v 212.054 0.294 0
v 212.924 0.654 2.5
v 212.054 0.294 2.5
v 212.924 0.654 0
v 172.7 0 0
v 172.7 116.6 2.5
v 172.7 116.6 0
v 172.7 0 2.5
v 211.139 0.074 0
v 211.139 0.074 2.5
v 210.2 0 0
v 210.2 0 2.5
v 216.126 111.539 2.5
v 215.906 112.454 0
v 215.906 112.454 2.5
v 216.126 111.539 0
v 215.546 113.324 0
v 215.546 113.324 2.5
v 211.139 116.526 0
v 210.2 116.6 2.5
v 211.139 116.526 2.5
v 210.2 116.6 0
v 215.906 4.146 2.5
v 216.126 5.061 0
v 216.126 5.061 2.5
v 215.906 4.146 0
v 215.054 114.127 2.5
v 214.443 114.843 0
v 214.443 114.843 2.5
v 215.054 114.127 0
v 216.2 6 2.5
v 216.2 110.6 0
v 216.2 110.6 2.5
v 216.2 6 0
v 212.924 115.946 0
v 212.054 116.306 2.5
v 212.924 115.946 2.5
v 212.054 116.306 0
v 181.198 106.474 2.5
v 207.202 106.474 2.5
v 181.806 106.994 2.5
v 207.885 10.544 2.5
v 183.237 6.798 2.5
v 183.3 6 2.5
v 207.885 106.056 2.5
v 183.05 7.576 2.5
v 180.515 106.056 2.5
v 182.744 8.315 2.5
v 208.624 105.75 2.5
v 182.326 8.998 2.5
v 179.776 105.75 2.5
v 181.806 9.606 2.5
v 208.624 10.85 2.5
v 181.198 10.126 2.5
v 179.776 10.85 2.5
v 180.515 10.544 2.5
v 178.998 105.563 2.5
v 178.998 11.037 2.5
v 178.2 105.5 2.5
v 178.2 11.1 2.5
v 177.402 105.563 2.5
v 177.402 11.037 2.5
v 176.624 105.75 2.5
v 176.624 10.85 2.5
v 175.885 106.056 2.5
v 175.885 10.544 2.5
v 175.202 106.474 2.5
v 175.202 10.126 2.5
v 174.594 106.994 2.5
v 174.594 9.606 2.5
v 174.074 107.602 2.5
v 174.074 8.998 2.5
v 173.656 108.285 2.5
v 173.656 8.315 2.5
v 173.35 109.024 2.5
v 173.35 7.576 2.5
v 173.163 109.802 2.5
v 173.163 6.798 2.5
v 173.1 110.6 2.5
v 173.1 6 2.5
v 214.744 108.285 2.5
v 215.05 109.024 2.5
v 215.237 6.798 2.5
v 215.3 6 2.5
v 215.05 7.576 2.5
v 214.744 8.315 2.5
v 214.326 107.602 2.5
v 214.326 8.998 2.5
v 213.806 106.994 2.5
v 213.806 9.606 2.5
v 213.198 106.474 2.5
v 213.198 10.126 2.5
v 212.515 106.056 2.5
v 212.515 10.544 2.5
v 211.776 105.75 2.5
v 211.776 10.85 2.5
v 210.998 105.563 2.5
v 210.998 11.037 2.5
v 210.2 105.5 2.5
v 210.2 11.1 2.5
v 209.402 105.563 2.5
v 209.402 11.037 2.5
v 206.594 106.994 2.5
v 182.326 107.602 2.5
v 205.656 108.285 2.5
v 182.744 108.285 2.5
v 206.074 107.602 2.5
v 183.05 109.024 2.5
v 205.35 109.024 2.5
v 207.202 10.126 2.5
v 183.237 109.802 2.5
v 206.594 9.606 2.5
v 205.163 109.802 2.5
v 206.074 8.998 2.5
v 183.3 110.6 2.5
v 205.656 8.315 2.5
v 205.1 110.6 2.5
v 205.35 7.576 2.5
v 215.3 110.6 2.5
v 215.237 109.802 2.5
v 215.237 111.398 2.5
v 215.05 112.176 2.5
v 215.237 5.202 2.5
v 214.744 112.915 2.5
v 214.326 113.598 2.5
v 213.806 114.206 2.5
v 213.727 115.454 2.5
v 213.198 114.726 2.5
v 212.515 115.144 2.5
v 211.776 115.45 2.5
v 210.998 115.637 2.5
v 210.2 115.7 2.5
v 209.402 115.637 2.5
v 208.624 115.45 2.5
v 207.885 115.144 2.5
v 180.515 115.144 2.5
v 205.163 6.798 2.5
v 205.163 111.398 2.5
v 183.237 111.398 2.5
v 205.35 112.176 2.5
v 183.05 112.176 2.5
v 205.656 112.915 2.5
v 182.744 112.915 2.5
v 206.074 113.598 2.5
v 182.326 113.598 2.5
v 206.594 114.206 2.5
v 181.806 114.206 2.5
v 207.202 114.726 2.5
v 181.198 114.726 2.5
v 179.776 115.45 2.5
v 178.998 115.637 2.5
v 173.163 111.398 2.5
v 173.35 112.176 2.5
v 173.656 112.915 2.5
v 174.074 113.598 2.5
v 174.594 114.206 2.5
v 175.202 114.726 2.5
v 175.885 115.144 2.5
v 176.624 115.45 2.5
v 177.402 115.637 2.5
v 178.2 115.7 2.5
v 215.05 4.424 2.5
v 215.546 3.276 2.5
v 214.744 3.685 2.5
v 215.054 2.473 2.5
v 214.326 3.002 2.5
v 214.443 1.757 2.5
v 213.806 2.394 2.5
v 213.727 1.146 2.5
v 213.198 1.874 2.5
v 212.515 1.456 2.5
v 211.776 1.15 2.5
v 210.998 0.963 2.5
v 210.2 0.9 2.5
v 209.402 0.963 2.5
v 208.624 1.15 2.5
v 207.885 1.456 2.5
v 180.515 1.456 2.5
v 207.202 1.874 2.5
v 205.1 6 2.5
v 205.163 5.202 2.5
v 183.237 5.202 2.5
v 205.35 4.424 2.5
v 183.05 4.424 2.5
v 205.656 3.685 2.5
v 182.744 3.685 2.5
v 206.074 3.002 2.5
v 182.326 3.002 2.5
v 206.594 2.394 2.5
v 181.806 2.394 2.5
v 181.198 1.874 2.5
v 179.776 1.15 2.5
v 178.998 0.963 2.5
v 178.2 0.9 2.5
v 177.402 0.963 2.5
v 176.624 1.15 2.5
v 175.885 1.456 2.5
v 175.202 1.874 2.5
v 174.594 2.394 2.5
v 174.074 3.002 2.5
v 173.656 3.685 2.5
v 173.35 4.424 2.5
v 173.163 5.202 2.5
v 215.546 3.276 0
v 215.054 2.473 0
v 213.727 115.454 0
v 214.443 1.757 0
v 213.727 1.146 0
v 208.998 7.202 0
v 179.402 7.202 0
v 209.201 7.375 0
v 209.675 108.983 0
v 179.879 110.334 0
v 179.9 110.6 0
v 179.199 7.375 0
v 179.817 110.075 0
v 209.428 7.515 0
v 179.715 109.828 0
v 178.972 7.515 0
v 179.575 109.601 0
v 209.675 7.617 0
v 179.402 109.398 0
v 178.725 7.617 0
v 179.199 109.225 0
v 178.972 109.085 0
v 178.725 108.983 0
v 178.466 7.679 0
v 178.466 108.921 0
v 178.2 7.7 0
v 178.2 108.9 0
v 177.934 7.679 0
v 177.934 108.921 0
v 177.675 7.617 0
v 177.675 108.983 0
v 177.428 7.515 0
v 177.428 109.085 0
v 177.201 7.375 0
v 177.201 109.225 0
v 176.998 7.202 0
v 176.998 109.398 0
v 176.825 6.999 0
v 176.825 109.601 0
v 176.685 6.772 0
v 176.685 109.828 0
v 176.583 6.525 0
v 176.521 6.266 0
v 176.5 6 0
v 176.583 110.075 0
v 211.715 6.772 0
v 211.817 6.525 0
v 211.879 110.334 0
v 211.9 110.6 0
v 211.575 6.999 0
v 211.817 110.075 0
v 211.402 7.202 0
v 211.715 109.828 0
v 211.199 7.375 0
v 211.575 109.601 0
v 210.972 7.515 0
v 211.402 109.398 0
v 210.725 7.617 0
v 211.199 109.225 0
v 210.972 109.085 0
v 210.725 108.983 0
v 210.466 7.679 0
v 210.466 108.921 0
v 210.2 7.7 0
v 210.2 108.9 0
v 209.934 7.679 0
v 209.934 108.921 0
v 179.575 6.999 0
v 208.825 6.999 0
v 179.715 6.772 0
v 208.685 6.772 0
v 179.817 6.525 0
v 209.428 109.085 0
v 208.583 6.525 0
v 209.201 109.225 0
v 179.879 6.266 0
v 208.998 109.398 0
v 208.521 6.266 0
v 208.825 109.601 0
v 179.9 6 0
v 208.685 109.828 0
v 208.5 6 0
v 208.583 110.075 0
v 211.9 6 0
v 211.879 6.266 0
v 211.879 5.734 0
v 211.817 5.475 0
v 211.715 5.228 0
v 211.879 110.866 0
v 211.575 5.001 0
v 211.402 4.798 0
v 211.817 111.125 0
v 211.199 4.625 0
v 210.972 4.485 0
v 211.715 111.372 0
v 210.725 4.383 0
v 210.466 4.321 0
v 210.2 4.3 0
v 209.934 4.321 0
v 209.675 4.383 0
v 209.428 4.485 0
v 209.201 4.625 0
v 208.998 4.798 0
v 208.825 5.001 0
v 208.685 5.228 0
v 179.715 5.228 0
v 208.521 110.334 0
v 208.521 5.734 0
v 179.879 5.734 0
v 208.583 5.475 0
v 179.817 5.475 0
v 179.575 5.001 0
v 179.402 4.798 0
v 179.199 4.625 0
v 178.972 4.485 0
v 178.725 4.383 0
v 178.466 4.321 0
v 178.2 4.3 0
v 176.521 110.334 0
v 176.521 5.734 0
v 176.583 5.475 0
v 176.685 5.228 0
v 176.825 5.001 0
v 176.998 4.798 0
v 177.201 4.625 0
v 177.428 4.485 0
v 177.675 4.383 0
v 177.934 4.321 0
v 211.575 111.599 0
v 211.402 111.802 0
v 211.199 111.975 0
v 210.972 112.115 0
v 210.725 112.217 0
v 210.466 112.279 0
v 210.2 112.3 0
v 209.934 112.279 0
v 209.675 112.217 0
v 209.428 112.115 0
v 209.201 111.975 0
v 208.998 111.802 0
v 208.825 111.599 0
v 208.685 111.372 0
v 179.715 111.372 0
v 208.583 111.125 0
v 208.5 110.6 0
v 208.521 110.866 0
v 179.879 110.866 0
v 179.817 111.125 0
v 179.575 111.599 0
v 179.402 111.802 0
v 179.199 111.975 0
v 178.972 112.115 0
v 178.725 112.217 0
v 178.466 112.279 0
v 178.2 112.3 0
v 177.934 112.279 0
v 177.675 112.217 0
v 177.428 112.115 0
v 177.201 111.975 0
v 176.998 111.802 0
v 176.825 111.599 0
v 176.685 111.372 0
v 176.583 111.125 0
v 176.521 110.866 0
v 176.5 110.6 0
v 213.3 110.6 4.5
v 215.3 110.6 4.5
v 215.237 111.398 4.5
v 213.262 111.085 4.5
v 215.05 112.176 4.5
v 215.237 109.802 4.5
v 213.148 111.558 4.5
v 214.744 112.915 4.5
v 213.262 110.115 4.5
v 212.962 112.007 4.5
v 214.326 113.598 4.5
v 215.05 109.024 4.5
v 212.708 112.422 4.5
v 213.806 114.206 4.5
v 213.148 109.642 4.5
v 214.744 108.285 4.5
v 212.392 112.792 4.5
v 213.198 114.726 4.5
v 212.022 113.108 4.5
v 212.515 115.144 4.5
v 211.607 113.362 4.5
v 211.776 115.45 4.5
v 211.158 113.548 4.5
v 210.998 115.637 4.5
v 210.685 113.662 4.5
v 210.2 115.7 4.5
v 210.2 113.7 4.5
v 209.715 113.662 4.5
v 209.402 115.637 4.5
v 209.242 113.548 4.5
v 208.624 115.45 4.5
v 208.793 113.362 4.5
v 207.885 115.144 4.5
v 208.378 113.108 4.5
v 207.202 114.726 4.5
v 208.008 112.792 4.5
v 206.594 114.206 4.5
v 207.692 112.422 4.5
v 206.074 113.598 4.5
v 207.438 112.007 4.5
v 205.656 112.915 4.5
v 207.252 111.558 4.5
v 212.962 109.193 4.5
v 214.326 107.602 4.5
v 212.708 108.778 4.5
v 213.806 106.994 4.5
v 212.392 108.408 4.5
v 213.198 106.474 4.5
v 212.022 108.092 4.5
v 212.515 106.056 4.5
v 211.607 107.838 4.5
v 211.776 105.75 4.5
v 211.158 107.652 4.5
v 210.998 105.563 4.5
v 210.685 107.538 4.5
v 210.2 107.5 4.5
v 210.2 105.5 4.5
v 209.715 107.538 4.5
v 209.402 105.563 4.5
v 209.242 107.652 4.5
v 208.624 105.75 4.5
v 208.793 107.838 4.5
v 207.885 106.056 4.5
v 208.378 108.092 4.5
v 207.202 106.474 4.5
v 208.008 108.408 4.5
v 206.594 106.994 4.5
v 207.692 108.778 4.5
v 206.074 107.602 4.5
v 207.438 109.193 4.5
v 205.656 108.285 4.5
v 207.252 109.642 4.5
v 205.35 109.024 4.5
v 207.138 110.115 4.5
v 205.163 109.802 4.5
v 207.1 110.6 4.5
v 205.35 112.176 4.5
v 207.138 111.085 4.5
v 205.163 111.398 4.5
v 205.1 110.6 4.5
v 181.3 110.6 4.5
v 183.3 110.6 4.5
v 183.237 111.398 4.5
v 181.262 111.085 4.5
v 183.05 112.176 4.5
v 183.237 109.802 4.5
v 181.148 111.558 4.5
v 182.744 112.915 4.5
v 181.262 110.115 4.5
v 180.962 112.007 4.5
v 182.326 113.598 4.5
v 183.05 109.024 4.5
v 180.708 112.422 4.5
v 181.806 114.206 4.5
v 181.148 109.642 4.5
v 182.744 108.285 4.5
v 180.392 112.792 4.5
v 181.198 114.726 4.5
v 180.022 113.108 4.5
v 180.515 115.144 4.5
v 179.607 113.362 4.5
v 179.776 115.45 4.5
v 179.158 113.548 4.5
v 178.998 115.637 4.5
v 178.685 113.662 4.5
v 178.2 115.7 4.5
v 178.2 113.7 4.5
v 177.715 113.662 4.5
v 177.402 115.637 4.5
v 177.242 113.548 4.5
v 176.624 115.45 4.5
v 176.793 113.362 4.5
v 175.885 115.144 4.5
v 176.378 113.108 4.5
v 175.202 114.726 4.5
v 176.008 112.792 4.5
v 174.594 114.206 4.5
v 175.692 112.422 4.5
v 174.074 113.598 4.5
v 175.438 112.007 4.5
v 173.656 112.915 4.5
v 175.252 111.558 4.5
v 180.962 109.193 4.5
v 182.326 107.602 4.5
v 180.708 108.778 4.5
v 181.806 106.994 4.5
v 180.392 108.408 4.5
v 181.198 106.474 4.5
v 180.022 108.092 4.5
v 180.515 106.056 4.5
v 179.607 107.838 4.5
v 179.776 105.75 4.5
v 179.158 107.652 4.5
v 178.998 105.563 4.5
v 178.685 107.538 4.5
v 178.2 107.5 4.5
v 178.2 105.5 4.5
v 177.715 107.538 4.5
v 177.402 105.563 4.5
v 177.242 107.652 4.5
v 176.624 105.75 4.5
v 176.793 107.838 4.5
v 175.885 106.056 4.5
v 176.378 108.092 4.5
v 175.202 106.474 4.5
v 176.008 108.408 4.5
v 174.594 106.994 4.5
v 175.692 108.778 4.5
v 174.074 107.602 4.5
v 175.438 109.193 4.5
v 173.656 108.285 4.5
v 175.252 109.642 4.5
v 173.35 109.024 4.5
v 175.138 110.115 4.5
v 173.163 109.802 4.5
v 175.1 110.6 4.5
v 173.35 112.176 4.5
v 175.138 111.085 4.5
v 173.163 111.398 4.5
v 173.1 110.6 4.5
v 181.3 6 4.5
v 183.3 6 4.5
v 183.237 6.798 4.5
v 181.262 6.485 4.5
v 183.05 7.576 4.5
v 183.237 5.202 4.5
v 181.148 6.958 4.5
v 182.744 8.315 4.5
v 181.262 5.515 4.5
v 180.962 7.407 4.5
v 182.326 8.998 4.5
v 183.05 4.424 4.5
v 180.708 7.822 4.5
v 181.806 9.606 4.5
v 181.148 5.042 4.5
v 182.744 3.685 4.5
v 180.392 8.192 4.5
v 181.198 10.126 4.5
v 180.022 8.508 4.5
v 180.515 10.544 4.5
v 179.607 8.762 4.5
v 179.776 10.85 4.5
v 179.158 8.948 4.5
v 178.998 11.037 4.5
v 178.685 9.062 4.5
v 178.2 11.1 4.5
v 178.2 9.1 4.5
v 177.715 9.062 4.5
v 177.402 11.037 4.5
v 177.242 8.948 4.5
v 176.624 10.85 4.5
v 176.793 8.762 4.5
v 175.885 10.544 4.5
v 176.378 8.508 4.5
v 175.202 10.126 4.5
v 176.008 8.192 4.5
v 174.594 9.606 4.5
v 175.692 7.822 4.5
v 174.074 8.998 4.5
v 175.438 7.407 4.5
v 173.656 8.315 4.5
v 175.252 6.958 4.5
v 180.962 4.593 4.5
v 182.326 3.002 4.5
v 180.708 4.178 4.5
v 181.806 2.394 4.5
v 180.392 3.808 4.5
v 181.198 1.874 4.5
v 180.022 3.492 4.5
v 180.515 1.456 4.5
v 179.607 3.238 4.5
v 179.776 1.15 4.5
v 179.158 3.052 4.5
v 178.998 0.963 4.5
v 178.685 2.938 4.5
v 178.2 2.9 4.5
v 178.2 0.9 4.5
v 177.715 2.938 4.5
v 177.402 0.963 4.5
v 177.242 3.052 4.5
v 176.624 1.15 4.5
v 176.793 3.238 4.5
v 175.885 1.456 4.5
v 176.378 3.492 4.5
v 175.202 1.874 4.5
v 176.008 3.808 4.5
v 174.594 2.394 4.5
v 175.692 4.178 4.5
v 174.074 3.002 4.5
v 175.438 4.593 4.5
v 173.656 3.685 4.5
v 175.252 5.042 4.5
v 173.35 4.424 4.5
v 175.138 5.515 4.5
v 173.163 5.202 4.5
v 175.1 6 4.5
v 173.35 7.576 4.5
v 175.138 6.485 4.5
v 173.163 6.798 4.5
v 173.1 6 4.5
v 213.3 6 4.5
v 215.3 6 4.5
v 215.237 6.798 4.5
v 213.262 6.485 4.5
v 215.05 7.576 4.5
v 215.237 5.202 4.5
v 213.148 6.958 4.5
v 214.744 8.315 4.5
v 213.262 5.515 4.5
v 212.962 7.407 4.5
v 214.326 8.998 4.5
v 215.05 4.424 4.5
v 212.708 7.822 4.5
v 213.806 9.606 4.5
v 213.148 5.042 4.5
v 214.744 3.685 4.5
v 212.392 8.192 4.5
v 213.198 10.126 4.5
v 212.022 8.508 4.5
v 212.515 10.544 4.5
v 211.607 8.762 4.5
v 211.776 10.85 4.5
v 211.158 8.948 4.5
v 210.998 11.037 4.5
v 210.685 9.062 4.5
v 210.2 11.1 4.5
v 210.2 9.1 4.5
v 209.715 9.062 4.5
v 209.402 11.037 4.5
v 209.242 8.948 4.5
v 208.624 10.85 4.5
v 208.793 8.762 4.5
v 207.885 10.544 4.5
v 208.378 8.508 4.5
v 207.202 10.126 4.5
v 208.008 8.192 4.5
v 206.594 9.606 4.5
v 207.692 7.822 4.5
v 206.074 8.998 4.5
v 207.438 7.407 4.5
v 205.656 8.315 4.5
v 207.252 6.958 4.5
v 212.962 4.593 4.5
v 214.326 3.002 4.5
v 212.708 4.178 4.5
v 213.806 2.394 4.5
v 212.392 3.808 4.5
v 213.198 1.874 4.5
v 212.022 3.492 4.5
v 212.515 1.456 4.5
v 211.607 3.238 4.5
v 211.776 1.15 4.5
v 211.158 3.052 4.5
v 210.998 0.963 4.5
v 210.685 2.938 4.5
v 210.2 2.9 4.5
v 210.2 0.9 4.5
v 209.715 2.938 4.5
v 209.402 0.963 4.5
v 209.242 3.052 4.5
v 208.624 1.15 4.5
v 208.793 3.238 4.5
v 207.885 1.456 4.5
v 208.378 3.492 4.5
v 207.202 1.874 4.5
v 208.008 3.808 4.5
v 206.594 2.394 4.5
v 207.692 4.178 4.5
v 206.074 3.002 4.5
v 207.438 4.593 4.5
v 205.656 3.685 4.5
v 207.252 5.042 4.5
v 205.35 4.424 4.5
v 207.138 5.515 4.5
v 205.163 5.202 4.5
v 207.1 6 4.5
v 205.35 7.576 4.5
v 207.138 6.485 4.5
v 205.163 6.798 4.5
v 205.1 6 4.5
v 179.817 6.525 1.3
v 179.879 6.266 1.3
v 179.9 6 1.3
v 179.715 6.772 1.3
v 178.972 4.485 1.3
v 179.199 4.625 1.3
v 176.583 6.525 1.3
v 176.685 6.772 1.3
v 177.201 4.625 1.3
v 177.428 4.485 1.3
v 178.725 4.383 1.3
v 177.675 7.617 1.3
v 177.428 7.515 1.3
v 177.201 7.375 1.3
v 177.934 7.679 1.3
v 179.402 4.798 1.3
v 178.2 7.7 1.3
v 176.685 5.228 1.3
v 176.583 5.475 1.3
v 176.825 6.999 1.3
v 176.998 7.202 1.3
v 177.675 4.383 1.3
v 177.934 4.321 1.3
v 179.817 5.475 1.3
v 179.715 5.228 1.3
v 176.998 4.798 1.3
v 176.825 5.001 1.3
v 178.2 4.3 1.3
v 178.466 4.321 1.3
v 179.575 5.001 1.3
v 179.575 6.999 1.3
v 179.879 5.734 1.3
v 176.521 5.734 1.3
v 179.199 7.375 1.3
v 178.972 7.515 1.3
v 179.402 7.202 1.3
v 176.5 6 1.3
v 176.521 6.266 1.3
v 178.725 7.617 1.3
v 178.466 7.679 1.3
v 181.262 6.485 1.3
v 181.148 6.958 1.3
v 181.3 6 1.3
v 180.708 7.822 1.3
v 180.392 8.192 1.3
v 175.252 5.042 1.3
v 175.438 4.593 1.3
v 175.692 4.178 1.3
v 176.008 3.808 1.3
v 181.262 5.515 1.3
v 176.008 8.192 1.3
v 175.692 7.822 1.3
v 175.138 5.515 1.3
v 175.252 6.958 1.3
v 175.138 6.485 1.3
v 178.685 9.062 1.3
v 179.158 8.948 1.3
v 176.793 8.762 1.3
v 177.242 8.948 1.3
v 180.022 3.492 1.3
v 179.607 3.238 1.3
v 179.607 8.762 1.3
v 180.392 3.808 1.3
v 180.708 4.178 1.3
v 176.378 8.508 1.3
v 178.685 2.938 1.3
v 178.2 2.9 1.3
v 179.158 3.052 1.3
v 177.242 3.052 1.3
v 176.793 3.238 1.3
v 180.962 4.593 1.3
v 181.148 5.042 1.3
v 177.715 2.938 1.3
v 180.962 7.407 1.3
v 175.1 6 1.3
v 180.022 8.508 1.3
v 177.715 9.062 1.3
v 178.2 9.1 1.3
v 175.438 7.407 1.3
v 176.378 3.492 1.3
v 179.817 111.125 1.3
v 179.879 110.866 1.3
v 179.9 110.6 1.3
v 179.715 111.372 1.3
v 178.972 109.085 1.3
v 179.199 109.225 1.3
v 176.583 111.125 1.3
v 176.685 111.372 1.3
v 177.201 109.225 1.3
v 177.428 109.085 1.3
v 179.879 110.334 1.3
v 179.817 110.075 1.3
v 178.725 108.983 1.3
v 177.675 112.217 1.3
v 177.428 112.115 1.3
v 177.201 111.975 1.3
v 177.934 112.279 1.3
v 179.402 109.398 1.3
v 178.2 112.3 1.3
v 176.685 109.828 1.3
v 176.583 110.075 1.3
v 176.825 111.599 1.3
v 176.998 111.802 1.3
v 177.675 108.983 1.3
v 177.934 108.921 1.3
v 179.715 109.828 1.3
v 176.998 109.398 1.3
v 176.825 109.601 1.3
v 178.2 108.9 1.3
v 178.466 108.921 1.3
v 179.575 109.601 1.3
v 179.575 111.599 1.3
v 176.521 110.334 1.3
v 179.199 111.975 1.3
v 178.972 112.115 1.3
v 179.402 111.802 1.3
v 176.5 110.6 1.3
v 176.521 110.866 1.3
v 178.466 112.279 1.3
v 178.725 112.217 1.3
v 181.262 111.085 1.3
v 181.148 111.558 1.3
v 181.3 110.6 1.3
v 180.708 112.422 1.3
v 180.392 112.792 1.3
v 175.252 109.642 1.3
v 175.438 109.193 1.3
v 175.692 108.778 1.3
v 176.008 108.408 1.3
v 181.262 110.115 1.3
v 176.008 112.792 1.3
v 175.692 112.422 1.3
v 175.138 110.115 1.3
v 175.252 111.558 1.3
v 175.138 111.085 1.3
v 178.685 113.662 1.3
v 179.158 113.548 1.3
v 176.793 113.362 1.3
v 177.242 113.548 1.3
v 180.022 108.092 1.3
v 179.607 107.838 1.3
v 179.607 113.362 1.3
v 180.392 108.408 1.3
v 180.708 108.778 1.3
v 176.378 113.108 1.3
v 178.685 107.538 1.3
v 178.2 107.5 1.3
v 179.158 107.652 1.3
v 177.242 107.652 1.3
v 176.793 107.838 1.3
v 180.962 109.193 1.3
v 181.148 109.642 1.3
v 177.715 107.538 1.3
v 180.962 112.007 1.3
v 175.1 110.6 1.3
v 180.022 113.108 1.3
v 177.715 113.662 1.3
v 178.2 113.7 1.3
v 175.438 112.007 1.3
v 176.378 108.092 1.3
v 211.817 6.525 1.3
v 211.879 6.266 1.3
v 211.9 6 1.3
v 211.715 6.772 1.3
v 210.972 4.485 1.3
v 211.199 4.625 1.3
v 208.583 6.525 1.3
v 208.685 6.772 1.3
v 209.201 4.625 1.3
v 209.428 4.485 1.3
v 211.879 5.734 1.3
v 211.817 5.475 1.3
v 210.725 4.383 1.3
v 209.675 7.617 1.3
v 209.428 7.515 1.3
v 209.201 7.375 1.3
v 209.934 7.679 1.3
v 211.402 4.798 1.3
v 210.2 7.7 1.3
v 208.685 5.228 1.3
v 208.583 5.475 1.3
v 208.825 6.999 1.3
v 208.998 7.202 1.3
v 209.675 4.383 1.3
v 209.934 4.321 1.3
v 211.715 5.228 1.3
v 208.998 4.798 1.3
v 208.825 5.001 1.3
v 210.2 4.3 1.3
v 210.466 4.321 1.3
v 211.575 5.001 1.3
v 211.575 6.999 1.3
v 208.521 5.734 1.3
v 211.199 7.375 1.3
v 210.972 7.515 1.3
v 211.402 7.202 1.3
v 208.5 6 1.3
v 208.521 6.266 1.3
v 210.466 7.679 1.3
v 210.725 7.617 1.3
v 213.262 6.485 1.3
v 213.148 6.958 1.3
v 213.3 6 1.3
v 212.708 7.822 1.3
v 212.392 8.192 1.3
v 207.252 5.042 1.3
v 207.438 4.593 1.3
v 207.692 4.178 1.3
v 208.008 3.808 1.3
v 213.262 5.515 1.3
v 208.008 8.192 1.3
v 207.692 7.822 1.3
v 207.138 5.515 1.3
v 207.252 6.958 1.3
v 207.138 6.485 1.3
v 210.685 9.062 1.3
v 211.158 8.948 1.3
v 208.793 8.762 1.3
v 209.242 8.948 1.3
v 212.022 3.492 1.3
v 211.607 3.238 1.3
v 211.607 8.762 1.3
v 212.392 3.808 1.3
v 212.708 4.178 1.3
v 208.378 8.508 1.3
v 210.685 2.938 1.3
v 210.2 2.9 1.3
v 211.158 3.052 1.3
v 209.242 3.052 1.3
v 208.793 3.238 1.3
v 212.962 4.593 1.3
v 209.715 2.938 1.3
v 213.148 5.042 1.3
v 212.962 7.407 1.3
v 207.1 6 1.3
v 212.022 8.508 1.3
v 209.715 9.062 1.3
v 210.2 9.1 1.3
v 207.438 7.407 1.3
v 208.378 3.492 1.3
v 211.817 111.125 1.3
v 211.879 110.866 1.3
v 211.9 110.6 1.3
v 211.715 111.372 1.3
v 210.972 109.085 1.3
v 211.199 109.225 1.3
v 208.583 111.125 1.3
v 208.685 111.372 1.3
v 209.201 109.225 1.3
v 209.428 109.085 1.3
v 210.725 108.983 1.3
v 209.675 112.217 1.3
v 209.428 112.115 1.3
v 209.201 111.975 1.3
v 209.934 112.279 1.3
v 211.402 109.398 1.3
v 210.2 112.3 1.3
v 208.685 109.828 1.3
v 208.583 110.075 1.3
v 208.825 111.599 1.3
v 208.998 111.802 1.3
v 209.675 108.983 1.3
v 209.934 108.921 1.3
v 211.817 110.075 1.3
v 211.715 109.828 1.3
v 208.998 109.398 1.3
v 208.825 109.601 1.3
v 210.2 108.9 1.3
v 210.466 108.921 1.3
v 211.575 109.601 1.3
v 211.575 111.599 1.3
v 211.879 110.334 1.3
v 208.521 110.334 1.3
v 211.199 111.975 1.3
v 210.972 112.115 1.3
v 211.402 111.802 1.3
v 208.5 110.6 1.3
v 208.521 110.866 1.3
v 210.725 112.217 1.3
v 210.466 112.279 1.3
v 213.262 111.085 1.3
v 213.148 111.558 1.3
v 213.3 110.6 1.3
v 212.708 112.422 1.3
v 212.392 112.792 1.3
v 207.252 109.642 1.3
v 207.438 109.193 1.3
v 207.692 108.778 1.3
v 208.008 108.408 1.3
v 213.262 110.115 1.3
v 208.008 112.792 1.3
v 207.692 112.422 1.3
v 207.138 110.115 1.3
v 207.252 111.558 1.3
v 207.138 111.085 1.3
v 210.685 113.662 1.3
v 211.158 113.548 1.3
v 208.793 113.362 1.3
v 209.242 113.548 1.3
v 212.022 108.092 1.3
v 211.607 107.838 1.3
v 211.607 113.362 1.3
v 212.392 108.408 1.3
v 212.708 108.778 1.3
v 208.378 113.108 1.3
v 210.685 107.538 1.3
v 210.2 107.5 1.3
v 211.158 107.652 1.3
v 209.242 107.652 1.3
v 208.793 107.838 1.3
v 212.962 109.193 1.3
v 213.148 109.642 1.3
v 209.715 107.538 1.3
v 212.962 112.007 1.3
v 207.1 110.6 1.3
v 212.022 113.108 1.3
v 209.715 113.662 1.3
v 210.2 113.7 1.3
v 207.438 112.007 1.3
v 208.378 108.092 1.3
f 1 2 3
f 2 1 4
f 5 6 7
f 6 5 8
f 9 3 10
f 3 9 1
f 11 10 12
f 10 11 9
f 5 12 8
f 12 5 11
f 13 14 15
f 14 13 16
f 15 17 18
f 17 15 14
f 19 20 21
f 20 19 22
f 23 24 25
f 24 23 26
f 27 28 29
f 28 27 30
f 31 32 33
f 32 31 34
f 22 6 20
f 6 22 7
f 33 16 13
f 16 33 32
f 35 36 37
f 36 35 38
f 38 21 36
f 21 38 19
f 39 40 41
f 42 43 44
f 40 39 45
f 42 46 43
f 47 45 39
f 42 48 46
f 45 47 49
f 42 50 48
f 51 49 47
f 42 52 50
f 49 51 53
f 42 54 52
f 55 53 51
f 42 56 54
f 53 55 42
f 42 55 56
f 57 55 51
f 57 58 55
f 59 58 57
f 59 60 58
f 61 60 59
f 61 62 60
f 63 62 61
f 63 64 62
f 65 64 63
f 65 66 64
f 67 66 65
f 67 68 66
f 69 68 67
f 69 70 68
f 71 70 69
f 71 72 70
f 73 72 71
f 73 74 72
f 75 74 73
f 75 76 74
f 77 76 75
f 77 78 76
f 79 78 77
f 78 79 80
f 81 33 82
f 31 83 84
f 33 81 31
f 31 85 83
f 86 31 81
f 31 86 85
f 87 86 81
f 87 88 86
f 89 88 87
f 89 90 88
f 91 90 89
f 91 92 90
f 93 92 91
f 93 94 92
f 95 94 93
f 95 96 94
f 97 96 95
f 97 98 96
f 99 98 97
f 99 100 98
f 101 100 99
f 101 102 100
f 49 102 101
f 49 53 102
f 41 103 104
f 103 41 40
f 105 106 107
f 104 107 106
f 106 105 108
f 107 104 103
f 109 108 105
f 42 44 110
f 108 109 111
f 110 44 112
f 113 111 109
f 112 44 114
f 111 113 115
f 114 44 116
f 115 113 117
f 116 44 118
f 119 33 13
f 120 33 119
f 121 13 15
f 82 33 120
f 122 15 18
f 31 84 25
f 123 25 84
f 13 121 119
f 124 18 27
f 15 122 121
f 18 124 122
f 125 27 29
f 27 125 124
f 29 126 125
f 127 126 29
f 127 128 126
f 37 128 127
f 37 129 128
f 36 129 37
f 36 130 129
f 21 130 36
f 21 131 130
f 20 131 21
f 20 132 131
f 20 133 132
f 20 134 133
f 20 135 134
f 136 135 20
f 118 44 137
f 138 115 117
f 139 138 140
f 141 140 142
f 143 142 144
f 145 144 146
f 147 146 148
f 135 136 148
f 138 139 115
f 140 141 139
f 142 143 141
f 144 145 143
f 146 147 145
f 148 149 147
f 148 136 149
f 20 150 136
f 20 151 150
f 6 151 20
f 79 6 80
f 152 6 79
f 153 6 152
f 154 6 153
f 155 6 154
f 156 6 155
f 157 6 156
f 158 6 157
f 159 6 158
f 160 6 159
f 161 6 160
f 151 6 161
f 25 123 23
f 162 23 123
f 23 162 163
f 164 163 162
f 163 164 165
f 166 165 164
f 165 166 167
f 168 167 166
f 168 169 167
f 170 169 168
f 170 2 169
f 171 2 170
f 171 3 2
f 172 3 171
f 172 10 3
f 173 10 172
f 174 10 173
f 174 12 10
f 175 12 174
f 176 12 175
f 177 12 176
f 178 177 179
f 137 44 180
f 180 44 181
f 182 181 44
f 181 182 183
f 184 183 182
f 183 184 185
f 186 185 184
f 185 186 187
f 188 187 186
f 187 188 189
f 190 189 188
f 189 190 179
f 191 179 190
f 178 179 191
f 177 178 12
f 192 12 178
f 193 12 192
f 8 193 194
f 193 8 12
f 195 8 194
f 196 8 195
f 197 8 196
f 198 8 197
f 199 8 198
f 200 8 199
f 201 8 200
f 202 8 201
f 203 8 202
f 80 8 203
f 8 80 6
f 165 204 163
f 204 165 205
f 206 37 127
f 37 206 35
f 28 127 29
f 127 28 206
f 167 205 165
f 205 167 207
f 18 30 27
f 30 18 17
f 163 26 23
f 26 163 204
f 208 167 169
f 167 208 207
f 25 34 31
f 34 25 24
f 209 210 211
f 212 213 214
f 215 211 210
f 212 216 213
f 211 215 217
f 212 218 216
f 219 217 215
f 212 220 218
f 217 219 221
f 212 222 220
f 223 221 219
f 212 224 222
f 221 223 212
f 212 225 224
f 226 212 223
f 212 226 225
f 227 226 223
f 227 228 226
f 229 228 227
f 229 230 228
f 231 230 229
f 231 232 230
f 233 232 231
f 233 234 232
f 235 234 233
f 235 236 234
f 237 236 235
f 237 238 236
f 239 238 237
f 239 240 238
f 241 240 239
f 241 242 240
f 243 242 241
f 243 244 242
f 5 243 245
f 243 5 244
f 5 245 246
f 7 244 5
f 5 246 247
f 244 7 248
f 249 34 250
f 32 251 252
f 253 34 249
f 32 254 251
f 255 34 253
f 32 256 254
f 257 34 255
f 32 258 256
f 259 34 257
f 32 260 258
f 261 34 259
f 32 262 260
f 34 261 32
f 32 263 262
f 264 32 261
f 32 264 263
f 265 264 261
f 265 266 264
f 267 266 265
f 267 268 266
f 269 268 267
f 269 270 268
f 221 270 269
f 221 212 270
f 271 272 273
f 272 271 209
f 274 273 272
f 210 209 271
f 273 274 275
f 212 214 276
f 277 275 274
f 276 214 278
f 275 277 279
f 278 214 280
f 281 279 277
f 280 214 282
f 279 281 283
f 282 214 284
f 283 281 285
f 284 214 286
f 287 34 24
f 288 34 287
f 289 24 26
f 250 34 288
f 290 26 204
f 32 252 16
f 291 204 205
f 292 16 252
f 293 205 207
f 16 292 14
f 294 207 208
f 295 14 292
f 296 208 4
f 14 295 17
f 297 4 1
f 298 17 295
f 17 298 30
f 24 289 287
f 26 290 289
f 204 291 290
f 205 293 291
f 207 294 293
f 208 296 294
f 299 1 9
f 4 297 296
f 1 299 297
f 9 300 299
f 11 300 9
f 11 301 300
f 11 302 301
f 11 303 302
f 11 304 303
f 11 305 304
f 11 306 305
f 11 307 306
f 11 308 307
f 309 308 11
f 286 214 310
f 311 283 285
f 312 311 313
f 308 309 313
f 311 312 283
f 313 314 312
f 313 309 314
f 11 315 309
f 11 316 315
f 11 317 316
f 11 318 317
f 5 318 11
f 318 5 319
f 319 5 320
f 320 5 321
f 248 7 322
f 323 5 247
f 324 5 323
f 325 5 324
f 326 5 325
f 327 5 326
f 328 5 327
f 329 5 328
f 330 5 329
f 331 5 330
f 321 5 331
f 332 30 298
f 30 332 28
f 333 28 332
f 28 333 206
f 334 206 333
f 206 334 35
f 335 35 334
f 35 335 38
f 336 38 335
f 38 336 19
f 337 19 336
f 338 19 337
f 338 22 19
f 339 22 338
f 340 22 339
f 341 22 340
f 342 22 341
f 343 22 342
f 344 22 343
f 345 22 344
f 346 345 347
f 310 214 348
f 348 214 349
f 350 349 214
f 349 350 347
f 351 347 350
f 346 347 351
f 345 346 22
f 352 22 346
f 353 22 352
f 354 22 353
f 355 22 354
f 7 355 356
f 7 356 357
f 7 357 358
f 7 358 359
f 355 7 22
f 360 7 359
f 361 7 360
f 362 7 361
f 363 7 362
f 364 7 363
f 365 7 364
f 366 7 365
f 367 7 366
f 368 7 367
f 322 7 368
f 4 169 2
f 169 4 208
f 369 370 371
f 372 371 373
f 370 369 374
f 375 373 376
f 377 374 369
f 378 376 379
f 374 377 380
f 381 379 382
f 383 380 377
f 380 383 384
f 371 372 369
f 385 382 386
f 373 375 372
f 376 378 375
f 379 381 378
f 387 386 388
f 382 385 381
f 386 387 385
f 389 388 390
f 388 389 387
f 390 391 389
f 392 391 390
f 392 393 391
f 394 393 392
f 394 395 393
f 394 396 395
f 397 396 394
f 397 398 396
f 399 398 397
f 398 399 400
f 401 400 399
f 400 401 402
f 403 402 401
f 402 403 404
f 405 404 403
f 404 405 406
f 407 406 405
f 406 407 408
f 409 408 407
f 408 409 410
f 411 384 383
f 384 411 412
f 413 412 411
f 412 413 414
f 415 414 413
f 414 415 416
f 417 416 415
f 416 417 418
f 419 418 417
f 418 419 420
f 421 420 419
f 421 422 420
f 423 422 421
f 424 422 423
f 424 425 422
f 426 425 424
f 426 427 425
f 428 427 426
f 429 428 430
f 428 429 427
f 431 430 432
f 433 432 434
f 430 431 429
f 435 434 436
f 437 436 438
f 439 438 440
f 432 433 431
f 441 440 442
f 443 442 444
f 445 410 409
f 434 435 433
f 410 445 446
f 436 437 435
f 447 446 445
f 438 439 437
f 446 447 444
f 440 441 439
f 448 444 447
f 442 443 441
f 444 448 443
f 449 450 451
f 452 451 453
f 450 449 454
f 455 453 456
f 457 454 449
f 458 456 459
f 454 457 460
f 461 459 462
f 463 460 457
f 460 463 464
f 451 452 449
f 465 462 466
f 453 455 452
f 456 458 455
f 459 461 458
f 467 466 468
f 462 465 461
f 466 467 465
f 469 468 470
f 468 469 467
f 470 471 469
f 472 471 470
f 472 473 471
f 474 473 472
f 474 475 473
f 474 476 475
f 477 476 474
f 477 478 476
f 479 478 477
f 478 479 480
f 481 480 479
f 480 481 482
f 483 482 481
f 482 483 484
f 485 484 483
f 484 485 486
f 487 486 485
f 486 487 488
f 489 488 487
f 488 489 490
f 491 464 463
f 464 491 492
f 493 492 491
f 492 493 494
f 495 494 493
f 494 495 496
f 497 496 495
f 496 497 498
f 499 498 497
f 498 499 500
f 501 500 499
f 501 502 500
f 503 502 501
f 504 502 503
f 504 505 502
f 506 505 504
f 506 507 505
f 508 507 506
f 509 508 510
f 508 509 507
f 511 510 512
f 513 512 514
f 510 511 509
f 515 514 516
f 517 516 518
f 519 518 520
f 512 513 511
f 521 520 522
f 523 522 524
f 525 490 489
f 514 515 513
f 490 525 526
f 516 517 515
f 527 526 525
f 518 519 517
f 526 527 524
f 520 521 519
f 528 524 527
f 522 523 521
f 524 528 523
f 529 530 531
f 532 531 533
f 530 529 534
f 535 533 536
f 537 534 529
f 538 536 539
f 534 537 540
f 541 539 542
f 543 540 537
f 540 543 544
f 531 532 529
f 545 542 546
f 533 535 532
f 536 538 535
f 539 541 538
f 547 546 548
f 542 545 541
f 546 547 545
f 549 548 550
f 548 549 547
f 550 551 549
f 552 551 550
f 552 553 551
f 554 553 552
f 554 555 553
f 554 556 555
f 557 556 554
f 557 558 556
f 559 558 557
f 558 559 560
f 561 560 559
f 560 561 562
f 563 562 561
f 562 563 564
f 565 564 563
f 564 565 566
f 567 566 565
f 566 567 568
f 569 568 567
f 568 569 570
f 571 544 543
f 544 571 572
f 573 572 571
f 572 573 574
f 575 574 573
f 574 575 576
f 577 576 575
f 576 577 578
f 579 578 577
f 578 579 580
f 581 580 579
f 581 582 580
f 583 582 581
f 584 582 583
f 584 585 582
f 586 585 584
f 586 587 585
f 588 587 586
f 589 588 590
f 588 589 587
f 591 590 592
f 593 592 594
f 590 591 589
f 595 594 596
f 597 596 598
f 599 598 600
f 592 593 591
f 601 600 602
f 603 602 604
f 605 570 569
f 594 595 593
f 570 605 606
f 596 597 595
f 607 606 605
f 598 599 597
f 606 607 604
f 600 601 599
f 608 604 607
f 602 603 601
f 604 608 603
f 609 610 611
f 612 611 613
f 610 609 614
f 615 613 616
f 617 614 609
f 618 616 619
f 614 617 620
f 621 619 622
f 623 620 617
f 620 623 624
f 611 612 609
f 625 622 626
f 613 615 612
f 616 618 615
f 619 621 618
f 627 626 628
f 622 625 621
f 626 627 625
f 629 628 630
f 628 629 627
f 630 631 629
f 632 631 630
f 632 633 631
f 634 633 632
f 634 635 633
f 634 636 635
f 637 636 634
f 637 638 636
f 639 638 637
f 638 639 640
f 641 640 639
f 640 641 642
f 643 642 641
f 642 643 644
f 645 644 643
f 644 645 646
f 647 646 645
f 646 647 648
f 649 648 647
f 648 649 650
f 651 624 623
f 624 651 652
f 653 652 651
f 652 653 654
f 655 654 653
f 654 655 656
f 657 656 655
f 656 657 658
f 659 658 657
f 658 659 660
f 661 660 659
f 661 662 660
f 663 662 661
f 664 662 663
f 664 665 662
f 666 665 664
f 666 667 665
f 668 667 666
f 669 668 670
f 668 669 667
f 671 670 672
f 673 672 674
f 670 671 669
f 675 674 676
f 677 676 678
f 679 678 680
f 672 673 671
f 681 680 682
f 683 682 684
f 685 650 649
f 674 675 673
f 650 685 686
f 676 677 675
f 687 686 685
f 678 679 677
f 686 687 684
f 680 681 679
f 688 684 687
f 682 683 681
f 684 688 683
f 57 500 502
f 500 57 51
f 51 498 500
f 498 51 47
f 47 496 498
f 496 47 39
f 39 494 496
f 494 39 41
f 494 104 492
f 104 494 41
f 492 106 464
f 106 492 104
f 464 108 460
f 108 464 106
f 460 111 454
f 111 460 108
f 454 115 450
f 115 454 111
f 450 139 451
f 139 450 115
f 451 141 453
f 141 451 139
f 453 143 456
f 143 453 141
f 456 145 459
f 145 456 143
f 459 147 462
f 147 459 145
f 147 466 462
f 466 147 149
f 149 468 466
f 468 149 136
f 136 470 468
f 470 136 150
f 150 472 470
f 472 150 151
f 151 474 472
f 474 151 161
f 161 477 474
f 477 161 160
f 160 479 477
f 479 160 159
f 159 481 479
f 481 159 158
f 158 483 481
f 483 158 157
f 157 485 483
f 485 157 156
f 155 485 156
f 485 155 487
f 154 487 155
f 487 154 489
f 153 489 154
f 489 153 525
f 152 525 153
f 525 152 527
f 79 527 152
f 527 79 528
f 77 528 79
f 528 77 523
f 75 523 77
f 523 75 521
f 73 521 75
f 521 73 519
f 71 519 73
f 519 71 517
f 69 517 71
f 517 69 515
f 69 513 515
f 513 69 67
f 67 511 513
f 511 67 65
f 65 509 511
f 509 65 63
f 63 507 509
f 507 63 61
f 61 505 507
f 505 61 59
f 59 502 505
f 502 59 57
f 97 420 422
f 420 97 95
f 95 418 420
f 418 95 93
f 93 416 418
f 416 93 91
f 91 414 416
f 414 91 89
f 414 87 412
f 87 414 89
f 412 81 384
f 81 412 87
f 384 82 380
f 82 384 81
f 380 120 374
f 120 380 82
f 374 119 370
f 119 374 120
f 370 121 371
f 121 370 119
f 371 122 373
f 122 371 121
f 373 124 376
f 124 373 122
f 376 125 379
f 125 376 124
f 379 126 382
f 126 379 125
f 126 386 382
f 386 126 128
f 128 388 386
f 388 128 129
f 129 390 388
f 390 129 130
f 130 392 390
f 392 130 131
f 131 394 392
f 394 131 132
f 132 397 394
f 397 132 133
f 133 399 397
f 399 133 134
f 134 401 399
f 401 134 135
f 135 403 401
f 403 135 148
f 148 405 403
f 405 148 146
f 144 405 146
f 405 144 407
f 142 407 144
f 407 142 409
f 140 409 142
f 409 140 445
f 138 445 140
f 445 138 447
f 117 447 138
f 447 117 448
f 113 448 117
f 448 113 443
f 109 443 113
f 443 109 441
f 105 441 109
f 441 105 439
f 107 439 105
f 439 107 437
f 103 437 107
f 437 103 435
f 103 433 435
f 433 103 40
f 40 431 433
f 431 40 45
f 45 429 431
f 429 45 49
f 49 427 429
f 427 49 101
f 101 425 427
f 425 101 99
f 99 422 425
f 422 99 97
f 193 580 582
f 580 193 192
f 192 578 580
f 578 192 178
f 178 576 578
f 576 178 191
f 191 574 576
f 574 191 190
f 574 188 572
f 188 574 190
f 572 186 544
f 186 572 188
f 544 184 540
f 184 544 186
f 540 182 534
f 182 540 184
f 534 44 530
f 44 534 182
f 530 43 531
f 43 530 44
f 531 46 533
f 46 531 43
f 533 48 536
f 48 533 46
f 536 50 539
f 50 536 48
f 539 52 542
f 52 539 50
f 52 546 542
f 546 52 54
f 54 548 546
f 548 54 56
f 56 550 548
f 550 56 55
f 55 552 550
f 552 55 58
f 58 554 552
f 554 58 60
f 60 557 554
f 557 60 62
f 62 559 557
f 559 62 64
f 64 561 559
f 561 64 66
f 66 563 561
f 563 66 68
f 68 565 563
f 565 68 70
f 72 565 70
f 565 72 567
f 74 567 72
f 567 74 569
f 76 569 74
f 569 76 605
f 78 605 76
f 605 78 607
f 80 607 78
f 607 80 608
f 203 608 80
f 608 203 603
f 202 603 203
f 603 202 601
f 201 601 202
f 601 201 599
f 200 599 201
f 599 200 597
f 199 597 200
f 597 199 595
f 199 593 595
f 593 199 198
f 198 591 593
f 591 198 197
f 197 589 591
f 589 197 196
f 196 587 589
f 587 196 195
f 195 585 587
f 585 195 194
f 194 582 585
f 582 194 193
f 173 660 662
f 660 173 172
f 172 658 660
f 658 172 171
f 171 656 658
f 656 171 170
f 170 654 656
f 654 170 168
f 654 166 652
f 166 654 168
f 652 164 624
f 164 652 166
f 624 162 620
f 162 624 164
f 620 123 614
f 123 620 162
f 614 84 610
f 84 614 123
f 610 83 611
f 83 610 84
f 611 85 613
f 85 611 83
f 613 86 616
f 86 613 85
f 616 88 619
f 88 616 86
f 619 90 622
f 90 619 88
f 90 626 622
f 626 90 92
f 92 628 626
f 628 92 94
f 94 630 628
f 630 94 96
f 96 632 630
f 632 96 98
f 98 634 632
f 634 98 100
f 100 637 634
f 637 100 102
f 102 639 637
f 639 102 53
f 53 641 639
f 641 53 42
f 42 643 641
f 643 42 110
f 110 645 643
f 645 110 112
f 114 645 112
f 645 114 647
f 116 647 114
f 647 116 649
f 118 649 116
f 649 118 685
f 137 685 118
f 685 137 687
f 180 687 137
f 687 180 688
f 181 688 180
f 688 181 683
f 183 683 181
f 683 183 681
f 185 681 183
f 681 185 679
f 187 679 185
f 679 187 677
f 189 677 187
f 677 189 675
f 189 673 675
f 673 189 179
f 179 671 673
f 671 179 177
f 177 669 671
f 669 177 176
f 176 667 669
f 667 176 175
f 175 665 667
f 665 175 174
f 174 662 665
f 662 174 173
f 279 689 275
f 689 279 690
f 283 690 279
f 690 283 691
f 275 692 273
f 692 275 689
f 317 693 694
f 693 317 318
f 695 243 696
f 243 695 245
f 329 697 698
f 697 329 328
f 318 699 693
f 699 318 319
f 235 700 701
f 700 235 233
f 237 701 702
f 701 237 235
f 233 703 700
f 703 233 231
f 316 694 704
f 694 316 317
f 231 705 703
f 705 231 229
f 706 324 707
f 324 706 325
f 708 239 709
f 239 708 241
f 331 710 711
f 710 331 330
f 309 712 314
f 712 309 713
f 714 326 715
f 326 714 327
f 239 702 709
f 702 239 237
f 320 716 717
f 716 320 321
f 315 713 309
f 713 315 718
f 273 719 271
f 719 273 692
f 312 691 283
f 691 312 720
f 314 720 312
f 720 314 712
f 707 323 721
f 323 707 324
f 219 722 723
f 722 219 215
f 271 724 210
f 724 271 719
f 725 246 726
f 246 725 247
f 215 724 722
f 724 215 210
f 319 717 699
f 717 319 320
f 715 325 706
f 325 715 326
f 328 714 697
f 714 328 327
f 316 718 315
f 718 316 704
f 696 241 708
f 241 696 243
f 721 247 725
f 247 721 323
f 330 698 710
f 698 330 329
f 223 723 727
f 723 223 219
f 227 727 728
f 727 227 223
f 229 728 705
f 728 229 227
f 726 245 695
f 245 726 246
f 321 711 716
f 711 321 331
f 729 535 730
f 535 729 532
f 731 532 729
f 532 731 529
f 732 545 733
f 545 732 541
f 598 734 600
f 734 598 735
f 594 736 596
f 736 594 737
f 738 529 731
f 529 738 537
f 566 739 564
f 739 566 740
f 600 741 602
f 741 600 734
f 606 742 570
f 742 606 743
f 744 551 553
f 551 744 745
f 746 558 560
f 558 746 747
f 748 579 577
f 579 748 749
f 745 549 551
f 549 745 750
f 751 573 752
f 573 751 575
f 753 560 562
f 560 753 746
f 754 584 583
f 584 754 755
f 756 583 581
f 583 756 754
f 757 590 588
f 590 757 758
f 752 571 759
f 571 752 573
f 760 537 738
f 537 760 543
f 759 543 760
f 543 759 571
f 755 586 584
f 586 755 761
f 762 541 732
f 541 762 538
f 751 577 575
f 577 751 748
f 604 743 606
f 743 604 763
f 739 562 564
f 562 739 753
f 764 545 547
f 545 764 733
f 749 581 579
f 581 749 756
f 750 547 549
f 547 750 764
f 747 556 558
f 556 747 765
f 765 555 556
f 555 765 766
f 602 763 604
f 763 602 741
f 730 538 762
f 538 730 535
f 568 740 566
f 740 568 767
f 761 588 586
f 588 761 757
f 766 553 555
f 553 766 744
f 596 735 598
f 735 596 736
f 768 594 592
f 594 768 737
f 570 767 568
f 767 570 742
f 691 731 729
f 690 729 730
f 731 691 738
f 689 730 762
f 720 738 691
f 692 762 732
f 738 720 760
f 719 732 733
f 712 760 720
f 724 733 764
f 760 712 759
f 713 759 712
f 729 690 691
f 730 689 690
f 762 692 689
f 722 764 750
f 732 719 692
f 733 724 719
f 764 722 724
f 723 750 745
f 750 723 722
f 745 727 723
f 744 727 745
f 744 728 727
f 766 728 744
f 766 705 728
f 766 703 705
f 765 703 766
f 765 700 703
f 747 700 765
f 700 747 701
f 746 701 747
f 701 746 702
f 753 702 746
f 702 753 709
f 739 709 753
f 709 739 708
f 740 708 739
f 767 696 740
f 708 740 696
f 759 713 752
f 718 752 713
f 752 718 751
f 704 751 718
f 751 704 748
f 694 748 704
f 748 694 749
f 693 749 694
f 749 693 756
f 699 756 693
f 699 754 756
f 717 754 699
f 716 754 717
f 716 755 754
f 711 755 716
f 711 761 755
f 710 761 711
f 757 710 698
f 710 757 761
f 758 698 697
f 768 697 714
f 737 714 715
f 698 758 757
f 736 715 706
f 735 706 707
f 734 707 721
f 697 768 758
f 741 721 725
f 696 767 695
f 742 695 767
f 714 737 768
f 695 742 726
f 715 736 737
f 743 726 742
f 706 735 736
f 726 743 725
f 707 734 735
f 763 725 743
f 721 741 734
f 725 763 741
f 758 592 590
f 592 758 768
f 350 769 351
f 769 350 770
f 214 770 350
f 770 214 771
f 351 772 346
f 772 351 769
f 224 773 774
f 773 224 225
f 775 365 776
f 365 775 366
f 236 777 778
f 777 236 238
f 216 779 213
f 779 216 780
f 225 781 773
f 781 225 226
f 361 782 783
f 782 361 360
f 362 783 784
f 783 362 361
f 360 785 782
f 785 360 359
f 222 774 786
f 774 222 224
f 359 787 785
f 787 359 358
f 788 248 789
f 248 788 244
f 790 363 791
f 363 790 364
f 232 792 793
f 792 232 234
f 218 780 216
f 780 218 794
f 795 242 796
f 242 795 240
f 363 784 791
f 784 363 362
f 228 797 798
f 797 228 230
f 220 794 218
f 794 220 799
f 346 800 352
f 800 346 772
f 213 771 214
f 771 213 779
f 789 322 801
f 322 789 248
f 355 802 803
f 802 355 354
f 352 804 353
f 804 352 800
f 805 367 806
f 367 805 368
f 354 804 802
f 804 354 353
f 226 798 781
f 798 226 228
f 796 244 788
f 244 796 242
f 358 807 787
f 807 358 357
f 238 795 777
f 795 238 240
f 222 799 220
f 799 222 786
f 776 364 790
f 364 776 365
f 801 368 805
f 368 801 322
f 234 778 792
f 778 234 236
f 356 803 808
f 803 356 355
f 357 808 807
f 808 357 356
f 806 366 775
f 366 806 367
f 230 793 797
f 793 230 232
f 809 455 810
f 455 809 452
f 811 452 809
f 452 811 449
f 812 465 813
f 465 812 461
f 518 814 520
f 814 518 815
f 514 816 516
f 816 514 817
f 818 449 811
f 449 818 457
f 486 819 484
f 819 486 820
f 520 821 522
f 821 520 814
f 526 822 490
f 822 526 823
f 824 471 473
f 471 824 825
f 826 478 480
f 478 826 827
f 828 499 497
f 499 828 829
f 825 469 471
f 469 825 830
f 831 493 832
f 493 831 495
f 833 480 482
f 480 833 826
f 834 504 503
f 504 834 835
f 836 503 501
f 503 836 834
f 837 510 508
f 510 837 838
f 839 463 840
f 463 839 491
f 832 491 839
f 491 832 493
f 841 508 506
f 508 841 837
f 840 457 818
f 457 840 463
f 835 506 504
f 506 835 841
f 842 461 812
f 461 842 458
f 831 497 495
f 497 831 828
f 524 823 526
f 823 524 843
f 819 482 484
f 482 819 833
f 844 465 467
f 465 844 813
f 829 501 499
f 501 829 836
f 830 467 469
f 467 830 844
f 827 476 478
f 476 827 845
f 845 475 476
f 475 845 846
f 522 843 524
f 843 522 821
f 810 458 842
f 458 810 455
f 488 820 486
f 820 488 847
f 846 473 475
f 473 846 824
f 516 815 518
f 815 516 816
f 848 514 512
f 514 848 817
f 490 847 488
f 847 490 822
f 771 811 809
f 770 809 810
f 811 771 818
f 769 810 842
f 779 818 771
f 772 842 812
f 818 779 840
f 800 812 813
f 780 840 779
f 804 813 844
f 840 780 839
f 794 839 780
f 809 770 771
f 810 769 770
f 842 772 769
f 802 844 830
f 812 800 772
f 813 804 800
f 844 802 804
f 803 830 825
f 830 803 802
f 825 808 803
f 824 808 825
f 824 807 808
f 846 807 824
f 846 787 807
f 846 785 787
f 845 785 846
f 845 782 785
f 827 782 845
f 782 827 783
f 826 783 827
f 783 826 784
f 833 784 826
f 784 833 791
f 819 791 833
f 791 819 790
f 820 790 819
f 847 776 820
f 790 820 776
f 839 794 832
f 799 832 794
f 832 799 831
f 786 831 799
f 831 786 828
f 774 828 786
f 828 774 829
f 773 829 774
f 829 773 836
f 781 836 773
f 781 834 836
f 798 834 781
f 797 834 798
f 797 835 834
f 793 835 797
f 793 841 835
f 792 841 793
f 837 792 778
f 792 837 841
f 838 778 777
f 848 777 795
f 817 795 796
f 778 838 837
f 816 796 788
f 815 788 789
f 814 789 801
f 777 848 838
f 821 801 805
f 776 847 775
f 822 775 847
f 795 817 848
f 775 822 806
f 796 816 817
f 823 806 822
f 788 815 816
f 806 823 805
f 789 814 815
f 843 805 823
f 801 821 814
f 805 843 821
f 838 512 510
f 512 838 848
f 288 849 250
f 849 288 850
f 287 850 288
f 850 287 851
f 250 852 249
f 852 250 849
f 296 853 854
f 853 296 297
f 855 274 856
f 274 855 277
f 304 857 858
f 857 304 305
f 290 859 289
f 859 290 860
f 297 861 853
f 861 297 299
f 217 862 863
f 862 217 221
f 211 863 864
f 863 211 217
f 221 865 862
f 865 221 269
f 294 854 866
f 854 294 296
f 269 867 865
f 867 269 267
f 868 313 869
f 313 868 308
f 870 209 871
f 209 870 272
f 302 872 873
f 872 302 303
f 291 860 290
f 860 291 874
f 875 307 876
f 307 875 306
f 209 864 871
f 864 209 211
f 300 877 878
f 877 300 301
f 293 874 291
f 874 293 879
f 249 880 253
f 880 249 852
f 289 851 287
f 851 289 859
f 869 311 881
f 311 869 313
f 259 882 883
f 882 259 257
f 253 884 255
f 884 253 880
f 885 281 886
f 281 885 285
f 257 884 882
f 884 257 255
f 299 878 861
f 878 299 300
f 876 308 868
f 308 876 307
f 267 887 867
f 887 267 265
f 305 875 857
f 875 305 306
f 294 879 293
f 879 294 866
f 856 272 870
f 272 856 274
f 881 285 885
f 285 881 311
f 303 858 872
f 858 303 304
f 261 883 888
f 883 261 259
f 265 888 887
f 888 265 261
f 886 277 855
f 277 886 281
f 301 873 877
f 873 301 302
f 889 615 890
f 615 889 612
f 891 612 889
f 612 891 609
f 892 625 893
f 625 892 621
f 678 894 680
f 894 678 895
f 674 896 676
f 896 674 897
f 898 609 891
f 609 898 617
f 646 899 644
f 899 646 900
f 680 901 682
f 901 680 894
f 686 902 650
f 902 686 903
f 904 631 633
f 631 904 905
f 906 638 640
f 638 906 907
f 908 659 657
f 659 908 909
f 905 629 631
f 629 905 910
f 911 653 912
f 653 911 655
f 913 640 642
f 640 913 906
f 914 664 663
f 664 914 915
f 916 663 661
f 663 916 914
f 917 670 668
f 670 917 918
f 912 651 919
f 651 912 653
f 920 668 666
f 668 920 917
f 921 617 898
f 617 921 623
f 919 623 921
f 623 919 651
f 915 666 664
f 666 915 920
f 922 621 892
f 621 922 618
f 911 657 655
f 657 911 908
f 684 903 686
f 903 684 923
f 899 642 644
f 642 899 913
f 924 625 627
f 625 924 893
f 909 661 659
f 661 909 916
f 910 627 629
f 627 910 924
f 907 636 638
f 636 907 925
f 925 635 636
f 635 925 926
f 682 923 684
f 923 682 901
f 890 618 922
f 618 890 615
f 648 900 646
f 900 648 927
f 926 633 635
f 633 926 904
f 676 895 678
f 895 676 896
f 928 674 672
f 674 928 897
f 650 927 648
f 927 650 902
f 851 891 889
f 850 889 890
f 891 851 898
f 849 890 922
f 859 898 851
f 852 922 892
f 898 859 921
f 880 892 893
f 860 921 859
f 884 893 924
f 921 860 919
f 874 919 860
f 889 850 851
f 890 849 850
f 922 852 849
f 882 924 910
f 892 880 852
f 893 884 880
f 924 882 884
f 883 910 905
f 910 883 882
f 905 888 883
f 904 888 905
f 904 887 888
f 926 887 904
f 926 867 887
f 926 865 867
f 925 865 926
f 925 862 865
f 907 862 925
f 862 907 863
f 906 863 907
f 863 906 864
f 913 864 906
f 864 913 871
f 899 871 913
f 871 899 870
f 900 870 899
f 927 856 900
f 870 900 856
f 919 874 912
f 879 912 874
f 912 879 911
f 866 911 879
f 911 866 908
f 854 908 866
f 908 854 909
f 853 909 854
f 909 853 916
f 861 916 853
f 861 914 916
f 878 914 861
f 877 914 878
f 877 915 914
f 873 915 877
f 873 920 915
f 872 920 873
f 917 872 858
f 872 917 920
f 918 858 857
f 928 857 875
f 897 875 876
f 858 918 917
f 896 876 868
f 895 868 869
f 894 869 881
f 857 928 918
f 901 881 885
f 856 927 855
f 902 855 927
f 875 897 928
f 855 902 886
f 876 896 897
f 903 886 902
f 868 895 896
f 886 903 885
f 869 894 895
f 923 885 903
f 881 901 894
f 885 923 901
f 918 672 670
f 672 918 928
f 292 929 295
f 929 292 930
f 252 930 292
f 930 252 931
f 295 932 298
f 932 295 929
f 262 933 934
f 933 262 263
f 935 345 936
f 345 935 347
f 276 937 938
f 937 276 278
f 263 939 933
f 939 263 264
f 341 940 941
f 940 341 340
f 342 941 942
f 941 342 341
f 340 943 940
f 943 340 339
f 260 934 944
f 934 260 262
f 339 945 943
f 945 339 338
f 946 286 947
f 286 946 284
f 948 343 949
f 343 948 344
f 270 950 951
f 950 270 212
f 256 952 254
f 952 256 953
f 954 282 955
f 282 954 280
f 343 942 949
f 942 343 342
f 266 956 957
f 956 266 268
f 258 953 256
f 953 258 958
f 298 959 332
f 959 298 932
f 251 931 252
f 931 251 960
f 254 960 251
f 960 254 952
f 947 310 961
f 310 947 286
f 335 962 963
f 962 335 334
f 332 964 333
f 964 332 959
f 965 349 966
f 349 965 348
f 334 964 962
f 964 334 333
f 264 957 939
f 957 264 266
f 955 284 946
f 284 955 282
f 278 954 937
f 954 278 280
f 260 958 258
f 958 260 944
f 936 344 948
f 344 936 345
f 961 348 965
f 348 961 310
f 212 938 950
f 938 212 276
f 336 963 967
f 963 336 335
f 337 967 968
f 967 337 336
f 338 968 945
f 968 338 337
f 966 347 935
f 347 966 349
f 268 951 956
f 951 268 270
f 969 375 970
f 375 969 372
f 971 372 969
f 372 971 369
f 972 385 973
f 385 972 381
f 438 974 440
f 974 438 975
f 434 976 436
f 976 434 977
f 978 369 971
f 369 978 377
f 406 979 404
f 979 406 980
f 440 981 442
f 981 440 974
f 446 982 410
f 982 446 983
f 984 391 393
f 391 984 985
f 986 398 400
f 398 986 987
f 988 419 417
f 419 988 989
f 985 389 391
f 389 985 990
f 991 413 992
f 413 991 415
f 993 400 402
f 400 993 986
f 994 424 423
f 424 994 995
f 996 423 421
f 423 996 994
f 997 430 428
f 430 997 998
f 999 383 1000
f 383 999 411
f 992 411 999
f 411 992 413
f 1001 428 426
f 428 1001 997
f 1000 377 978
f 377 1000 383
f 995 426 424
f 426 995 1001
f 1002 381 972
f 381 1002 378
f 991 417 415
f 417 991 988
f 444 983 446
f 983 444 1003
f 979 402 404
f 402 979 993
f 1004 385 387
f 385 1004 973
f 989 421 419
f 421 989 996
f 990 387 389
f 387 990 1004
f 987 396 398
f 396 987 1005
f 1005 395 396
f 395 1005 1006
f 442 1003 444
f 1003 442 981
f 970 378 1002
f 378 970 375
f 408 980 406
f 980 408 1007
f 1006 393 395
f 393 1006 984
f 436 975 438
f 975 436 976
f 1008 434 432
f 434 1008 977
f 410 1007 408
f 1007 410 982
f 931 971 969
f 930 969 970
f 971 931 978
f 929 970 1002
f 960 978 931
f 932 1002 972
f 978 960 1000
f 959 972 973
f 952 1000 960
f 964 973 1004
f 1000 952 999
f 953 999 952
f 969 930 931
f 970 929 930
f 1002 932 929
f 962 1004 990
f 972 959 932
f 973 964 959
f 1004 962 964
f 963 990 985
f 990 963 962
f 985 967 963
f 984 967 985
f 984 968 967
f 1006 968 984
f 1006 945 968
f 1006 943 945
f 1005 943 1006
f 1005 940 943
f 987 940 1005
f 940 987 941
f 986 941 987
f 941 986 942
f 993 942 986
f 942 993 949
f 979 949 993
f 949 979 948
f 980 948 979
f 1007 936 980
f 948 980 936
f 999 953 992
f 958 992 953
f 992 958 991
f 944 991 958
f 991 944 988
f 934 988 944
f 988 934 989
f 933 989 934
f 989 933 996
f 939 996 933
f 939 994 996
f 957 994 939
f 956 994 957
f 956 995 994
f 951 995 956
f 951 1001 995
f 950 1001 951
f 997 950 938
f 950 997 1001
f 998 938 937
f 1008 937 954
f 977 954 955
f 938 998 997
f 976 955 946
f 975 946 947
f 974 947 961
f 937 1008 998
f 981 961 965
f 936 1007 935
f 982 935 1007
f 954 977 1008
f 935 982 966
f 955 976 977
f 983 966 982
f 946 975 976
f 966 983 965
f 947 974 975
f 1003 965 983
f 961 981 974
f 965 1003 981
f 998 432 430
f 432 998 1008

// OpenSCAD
include <../lib/kobo-meshcore-case-lib.scad>;
$fn = 40;
bay_lid();
